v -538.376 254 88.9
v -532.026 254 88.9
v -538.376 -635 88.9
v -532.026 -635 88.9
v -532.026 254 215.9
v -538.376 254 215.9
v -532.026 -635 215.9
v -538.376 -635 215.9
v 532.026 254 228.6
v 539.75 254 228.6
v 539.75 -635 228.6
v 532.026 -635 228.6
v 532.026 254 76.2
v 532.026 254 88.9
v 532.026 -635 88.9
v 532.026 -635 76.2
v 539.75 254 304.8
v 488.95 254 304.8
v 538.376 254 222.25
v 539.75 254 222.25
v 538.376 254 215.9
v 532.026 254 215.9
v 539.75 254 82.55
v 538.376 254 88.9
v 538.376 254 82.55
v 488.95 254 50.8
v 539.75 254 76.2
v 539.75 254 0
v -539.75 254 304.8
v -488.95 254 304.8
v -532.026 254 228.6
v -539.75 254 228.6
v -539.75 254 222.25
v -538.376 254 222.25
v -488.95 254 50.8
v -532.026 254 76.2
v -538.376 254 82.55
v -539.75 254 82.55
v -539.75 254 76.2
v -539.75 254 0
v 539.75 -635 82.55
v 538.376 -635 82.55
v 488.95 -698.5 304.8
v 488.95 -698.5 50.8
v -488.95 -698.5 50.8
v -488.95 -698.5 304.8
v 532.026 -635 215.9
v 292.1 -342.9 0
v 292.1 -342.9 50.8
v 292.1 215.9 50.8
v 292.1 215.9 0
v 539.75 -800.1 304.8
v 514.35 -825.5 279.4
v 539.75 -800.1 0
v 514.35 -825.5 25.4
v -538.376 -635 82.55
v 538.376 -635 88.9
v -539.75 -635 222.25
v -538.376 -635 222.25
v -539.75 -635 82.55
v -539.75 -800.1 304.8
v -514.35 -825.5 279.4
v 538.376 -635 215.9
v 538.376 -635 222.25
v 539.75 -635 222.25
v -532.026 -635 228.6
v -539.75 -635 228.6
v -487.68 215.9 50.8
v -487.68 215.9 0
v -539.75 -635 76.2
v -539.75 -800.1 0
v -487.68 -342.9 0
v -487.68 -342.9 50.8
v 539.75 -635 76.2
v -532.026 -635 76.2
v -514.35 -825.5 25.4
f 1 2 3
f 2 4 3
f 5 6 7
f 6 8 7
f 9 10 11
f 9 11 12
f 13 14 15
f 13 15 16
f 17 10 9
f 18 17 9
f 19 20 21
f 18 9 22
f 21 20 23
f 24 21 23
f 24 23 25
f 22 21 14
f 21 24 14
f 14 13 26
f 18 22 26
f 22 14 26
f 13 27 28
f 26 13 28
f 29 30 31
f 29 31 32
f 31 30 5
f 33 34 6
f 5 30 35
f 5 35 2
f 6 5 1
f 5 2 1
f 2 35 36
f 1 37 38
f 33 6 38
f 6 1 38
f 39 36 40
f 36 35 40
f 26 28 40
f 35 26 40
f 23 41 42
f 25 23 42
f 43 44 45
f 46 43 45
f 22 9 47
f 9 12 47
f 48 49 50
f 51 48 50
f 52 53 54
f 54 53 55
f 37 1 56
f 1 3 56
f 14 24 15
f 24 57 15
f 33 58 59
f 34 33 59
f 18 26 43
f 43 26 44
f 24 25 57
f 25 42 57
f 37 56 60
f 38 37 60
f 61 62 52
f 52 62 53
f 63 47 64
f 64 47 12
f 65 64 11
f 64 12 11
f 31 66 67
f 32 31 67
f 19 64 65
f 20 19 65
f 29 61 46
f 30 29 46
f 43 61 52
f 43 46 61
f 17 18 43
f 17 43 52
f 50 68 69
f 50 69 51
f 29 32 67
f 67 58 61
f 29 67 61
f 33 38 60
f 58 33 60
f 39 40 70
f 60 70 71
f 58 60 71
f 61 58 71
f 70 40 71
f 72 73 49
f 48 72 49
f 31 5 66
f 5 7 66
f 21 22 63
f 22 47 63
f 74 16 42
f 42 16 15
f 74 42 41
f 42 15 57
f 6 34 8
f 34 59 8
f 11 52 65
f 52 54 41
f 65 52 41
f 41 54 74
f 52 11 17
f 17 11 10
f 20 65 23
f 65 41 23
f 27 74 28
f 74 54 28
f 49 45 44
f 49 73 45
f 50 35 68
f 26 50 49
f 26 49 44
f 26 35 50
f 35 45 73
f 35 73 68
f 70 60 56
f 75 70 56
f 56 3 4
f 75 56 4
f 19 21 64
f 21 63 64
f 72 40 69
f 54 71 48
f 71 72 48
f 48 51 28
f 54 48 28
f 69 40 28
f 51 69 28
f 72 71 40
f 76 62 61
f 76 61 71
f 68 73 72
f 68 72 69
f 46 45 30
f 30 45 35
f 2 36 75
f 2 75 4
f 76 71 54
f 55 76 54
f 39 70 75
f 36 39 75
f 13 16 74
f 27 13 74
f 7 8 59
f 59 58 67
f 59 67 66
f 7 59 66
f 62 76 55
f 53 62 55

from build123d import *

# Parameters (mm, degrees)
F2_DEPTH       = 304.8
F3_W           = 1079.5
F3_H           = 1079.5
F4_DEPTH       = 50.8
F5_SIZE        = 25.4
F7_R           = 63.5
F8_DEPTH       = 50.8
F9_W           = 779.78
F9_H           = 558.8
F9_W_2         = 754.38
F9_H_2         = 533.4
F9_R           = 63.5
F10_DEPTH      = 50.8
F12_DEPTH      = 254
F12_DEPTH_BACK = 635


with BuildPart() as f2:
    # F1 (on face) → F2 (new body)
    with BuildSketch(Plane.XY):
        Polygon((539.75, -825.5), (539.75, 254), (488.95, 254), (488.95, -698.5), (-488.95, -698.5), (-488.95, 254), (-539.75, 254), (-539.75, -825.5), align=None)
    extrude(amount=F2_DEPTH)

    # F3 (on Top) → F4 (join)
    with BuildSketch(Plane.XY):
        with Locations((0, -285.75)):
            Rectangle(F3_W, F3_H)
    extrude(amount=F4_DEPTH)

    # F5
    f5_edges = [f2.edges().sort_by_distance(p)[0] for p in [
        (0, -825.5, 0),
        (-539.75, -825.5, 152.4),
        (0, -825.5, 304.8),
        (539.75, -825.5, 152.4),
    ]]
    chamfer(f5_edges, length=F5_SIZE)

    # F7 (on face) → F8 (cut, through all)
    with BuildSketch(Plane.XY.offset(50.8)):
        Circle(F7_R)
    extrude(amount=-F8_DEPTH, mode=Mode.SUBTRACT)

    # F9 (on face) → F10 (cut, through all)
    with BuildSketch(Plane.XY.offset(50.8)):
        with Locations((-97.79, -63.5)):
            Rectangle(F9_W, F9_H)
        with Locations((-97.79, -63.5)):
            Rectangle(F9_W_2, F9_H_2, mode=Mode.SUBTRACT)
        with Locations((-97.79, -63.5)):
            Rectangle(F9_W_2, F9_H_2)
        Circle(F9_R, mode=Mode.SUBTRACT)
    extrude(amount=-F10_DEPTH, mode=Mode.SUBTRACT)

    # F11 (on Front) → F12 (cut, two sides)
    with BuildSketch(Plane.XZ) as f12_sk:
        Polygon((557.425588846, 76.2), (557.425588846, 152.4), (557.425588846, 228.6), (532.025588846, 228.6), (532.025588846, 215.9), (538.375588846, 215.9), (538.375588846, 222.25), (551.075588846, 222.25), (551.075588846, 152.4), (551.075588846, 82.55), (538.375588846, 82.55), (538.375588846, 88.9), (532.025588846, 88.9), (532.025588846, 76.2), align=None)
        Polygon((-532.025588846, 88.9), (-538.375588846, 88.9), (-538.375588846, 82.55), (-551.075588846, 82.55), (-551.075588846, 152.4), (-551.075588846, 222.25), (-538.375588846, 222.25), (-538.375588846, 215.9), (-532.025588846, 215.9), (-532.025588846, 228.6), (-557.425588846, 228.6), (-557.425588846, 152.4), (-557.425588846, 76.2), (-532.025588846, 76.2), align=None)
    extrude(amount=-F12_DEPTH, mode=Mode.SUBTRACT)
    extrude(f12_sk.sketch, amount=F12_DEPTH_BACK, mode=Mode.SUBTRACT)


solid = f2.part
